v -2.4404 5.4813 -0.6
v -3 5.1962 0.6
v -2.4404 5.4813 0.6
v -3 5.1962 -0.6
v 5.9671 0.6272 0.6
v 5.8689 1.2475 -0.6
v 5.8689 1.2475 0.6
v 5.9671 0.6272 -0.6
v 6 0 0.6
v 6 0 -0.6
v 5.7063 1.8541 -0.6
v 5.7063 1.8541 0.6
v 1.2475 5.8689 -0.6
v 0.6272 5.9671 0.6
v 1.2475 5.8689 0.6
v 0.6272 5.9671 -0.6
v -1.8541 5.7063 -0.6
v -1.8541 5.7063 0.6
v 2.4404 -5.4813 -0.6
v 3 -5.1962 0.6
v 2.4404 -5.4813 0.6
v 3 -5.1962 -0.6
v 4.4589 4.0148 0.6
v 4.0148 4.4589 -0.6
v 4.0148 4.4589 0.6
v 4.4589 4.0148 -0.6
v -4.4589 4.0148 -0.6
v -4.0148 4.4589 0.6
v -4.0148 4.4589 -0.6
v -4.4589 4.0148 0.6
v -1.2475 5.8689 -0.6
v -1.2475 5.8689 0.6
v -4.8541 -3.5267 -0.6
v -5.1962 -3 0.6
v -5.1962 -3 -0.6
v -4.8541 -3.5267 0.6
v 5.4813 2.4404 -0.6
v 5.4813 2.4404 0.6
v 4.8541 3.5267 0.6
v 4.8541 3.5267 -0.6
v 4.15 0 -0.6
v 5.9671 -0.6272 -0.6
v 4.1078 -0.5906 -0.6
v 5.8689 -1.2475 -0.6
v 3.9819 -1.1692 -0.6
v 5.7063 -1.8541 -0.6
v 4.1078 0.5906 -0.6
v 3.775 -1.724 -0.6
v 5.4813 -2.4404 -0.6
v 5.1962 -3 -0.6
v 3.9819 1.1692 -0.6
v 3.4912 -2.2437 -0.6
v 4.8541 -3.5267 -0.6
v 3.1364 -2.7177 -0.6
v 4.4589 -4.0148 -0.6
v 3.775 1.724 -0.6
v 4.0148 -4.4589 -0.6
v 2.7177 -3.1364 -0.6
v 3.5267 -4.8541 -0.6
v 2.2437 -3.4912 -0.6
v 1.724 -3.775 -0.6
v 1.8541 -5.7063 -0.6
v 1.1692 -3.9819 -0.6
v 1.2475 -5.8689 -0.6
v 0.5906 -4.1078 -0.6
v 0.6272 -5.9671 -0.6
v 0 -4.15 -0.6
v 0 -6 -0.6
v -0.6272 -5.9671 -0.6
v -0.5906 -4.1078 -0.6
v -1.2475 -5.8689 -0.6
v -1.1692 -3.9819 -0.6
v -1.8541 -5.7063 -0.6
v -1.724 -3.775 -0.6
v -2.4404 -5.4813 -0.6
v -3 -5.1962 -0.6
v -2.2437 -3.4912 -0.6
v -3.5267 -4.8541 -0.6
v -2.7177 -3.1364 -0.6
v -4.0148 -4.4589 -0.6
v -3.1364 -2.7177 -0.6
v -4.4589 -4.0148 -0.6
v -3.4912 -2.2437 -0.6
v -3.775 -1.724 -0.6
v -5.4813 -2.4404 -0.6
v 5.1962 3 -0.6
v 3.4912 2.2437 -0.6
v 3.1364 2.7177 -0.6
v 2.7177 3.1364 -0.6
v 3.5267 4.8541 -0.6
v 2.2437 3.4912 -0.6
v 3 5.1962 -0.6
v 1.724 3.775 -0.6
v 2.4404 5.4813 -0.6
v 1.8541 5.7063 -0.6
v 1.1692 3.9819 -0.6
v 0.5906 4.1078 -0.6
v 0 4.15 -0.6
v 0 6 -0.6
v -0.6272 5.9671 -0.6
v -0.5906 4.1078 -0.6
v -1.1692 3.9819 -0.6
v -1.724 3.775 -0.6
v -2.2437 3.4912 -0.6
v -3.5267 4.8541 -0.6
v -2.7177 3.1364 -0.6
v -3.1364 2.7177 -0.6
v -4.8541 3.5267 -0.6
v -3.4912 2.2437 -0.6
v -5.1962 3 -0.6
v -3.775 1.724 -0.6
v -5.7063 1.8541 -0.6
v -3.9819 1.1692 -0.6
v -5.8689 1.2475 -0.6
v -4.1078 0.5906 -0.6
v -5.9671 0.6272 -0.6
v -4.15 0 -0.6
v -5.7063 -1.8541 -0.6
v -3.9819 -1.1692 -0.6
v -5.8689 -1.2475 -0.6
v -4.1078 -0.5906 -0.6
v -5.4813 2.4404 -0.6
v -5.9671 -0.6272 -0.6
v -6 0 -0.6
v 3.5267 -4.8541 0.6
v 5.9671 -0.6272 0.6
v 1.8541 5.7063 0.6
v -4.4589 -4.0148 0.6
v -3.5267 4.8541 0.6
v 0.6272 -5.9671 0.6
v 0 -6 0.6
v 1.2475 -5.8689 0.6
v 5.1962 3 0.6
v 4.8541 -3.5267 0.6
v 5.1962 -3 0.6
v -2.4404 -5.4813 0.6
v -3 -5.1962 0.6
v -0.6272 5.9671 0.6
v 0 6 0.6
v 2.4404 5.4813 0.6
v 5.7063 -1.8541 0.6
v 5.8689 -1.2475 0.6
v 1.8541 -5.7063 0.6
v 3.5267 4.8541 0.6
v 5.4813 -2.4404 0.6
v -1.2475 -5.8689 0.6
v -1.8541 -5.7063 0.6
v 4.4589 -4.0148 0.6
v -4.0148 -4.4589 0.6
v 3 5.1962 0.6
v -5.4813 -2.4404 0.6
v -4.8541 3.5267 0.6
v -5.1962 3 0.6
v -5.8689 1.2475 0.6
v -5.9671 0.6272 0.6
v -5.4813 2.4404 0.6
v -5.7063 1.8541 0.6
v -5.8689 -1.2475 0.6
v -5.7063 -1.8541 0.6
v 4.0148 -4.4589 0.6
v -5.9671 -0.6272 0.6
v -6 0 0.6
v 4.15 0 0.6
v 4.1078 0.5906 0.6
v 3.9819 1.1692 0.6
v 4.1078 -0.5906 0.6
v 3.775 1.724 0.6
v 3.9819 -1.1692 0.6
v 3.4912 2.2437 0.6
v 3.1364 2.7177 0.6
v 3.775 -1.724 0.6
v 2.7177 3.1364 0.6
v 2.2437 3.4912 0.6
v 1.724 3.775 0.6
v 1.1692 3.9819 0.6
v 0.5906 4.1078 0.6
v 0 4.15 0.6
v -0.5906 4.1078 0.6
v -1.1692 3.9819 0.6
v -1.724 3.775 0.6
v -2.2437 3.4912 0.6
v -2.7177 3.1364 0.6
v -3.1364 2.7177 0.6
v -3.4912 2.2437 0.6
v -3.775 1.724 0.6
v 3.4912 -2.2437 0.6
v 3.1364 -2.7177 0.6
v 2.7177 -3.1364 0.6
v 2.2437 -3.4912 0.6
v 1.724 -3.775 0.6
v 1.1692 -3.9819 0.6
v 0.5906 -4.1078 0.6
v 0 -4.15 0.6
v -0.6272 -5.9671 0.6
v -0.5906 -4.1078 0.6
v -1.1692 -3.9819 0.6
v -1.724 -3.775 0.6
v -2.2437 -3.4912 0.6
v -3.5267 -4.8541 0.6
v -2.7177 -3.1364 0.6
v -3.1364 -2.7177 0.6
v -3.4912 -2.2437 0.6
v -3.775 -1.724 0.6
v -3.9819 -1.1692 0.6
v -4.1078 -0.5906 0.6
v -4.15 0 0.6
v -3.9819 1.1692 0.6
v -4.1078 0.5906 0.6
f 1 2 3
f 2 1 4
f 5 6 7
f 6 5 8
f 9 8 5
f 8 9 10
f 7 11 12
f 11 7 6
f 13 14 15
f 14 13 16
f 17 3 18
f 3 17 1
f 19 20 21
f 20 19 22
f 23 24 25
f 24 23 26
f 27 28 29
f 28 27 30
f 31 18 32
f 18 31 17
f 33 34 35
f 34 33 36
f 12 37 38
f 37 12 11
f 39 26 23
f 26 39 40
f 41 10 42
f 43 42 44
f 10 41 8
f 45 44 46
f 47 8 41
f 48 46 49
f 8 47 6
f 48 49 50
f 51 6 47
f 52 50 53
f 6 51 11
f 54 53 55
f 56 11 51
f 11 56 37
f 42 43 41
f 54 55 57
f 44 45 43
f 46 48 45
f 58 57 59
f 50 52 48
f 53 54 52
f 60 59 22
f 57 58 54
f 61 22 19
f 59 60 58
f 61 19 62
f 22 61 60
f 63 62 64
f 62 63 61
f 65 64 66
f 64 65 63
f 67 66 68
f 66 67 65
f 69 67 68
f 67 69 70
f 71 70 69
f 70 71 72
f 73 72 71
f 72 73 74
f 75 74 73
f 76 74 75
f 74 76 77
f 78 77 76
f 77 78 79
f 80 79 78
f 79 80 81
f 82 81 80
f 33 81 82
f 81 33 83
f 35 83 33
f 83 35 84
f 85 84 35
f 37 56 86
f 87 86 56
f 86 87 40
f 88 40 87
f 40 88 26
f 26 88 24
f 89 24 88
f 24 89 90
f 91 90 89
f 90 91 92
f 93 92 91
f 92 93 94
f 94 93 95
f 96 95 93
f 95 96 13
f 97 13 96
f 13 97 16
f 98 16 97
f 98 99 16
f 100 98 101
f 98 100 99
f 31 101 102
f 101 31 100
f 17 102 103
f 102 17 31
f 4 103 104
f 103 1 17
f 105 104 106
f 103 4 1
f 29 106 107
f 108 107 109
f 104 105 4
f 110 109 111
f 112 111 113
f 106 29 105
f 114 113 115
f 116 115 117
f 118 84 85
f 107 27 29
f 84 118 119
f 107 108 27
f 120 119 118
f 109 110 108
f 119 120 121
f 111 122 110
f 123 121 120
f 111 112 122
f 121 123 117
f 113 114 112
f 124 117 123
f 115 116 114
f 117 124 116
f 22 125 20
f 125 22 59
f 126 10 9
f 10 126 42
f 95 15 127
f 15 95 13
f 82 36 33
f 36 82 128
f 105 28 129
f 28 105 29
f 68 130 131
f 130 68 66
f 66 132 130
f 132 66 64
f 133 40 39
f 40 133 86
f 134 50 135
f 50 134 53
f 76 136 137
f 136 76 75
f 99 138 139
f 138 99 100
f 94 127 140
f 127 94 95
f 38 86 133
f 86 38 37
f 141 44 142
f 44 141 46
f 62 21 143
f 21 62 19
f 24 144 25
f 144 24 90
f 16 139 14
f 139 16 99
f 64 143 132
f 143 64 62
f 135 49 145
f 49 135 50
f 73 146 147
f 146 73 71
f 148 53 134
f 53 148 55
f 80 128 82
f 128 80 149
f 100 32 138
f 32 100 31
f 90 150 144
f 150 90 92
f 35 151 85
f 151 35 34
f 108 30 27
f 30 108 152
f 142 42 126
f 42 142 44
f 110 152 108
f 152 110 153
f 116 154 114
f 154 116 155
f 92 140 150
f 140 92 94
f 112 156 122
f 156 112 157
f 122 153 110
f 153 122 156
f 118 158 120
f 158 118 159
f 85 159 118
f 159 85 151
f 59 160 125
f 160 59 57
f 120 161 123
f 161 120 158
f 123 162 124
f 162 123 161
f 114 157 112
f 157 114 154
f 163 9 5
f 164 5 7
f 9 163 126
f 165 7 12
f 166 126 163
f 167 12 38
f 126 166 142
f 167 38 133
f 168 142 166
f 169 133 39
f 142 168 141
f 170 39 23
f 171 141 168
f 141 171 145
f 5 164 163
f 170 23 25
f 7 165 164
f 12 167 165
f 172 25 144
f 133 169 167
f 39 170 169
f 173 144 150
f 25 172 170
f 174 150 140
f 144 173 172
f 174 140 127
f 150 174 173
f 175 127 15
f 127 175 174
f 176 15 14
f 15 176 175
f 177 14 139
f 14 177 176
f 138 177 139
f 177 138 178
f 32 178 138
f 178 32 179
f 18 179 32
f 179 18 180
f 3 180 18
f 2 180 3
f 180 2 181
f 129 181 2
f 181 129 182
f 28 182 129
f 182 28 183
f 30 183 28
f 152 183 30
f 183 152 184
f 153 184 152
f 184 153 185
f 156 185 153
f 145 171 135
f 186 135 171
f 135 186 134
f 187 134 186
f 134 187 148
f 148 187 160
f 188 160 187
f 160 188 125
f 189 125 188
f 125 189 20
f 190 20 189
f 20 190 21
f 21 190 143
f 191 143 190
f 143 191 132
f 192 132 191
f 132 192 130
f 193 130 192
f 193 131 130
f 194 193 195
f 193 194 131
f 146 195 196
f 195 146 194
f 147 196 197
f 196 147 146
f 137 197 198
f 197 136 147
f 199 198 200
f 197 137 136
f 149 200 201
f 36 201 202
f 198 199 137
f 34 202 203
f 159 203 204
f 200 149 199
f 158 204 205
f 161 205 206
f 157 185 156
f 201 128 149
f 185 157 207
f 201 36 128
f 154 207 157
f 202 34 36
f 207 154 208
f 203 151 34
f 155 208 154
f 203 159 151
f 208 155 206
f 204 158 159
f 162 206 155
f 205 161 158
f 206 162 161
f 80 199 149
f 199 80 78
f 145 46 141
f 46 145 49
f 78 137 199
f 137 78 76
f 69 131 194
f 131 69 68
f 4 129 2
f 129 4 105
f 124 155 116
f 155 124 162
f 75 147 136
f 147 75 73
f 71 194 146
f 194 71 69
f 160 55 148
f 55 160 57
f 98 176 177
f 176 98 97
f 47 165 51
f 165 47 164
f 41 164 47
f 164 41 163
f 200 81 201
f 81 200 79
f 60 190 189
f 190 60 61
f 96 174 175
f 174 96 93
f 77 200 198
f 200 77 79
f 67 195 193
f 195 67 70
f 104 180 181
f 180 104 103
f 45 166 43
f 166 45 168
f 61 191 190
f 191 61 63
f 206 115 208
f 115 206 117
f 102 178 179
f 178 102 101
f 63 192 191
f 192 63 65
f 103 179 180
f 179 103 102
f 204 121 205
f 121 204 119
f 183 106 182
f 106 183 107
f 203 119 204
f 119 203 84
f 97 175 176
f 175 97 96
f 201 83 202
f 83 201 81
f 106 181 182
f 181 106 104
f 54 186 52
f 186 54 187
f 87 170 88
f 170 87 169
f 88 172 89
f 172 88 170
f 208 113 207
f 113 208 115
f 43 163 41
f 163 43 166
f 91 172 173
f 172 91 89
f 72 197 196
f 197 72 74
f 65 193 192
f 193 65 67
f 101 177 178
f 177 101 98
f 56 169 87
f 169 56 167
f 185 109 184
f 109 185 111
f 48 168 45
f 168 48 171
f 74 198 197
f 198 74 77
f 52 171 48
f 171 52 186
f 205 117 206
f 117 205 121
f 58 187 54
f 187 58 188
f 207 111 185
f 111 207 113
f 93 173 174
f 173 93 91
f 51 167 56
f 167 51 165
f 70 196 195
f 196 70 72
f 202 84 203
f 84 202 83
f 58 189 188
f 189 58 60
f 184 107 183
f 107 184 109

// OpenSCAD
use <common.scad>

// 용어
// 1. 와셔(washer)
// 2. 내경(inner diameter)
// 3. 두께(thickness)
//
// M8 와셔(washer)는 M8 체결부의 내경(inner diameter) 기준으로 모델링합니다.
function washer_m8_t() = 1.2;   // 두께(thickness) (mm)

module washer_m8(part_color = [0.7, 0, 1]) {
    washer(id = 8,
           thickness = washer_m8_t(),
           part_color = part_color);
}

washer_m8();
